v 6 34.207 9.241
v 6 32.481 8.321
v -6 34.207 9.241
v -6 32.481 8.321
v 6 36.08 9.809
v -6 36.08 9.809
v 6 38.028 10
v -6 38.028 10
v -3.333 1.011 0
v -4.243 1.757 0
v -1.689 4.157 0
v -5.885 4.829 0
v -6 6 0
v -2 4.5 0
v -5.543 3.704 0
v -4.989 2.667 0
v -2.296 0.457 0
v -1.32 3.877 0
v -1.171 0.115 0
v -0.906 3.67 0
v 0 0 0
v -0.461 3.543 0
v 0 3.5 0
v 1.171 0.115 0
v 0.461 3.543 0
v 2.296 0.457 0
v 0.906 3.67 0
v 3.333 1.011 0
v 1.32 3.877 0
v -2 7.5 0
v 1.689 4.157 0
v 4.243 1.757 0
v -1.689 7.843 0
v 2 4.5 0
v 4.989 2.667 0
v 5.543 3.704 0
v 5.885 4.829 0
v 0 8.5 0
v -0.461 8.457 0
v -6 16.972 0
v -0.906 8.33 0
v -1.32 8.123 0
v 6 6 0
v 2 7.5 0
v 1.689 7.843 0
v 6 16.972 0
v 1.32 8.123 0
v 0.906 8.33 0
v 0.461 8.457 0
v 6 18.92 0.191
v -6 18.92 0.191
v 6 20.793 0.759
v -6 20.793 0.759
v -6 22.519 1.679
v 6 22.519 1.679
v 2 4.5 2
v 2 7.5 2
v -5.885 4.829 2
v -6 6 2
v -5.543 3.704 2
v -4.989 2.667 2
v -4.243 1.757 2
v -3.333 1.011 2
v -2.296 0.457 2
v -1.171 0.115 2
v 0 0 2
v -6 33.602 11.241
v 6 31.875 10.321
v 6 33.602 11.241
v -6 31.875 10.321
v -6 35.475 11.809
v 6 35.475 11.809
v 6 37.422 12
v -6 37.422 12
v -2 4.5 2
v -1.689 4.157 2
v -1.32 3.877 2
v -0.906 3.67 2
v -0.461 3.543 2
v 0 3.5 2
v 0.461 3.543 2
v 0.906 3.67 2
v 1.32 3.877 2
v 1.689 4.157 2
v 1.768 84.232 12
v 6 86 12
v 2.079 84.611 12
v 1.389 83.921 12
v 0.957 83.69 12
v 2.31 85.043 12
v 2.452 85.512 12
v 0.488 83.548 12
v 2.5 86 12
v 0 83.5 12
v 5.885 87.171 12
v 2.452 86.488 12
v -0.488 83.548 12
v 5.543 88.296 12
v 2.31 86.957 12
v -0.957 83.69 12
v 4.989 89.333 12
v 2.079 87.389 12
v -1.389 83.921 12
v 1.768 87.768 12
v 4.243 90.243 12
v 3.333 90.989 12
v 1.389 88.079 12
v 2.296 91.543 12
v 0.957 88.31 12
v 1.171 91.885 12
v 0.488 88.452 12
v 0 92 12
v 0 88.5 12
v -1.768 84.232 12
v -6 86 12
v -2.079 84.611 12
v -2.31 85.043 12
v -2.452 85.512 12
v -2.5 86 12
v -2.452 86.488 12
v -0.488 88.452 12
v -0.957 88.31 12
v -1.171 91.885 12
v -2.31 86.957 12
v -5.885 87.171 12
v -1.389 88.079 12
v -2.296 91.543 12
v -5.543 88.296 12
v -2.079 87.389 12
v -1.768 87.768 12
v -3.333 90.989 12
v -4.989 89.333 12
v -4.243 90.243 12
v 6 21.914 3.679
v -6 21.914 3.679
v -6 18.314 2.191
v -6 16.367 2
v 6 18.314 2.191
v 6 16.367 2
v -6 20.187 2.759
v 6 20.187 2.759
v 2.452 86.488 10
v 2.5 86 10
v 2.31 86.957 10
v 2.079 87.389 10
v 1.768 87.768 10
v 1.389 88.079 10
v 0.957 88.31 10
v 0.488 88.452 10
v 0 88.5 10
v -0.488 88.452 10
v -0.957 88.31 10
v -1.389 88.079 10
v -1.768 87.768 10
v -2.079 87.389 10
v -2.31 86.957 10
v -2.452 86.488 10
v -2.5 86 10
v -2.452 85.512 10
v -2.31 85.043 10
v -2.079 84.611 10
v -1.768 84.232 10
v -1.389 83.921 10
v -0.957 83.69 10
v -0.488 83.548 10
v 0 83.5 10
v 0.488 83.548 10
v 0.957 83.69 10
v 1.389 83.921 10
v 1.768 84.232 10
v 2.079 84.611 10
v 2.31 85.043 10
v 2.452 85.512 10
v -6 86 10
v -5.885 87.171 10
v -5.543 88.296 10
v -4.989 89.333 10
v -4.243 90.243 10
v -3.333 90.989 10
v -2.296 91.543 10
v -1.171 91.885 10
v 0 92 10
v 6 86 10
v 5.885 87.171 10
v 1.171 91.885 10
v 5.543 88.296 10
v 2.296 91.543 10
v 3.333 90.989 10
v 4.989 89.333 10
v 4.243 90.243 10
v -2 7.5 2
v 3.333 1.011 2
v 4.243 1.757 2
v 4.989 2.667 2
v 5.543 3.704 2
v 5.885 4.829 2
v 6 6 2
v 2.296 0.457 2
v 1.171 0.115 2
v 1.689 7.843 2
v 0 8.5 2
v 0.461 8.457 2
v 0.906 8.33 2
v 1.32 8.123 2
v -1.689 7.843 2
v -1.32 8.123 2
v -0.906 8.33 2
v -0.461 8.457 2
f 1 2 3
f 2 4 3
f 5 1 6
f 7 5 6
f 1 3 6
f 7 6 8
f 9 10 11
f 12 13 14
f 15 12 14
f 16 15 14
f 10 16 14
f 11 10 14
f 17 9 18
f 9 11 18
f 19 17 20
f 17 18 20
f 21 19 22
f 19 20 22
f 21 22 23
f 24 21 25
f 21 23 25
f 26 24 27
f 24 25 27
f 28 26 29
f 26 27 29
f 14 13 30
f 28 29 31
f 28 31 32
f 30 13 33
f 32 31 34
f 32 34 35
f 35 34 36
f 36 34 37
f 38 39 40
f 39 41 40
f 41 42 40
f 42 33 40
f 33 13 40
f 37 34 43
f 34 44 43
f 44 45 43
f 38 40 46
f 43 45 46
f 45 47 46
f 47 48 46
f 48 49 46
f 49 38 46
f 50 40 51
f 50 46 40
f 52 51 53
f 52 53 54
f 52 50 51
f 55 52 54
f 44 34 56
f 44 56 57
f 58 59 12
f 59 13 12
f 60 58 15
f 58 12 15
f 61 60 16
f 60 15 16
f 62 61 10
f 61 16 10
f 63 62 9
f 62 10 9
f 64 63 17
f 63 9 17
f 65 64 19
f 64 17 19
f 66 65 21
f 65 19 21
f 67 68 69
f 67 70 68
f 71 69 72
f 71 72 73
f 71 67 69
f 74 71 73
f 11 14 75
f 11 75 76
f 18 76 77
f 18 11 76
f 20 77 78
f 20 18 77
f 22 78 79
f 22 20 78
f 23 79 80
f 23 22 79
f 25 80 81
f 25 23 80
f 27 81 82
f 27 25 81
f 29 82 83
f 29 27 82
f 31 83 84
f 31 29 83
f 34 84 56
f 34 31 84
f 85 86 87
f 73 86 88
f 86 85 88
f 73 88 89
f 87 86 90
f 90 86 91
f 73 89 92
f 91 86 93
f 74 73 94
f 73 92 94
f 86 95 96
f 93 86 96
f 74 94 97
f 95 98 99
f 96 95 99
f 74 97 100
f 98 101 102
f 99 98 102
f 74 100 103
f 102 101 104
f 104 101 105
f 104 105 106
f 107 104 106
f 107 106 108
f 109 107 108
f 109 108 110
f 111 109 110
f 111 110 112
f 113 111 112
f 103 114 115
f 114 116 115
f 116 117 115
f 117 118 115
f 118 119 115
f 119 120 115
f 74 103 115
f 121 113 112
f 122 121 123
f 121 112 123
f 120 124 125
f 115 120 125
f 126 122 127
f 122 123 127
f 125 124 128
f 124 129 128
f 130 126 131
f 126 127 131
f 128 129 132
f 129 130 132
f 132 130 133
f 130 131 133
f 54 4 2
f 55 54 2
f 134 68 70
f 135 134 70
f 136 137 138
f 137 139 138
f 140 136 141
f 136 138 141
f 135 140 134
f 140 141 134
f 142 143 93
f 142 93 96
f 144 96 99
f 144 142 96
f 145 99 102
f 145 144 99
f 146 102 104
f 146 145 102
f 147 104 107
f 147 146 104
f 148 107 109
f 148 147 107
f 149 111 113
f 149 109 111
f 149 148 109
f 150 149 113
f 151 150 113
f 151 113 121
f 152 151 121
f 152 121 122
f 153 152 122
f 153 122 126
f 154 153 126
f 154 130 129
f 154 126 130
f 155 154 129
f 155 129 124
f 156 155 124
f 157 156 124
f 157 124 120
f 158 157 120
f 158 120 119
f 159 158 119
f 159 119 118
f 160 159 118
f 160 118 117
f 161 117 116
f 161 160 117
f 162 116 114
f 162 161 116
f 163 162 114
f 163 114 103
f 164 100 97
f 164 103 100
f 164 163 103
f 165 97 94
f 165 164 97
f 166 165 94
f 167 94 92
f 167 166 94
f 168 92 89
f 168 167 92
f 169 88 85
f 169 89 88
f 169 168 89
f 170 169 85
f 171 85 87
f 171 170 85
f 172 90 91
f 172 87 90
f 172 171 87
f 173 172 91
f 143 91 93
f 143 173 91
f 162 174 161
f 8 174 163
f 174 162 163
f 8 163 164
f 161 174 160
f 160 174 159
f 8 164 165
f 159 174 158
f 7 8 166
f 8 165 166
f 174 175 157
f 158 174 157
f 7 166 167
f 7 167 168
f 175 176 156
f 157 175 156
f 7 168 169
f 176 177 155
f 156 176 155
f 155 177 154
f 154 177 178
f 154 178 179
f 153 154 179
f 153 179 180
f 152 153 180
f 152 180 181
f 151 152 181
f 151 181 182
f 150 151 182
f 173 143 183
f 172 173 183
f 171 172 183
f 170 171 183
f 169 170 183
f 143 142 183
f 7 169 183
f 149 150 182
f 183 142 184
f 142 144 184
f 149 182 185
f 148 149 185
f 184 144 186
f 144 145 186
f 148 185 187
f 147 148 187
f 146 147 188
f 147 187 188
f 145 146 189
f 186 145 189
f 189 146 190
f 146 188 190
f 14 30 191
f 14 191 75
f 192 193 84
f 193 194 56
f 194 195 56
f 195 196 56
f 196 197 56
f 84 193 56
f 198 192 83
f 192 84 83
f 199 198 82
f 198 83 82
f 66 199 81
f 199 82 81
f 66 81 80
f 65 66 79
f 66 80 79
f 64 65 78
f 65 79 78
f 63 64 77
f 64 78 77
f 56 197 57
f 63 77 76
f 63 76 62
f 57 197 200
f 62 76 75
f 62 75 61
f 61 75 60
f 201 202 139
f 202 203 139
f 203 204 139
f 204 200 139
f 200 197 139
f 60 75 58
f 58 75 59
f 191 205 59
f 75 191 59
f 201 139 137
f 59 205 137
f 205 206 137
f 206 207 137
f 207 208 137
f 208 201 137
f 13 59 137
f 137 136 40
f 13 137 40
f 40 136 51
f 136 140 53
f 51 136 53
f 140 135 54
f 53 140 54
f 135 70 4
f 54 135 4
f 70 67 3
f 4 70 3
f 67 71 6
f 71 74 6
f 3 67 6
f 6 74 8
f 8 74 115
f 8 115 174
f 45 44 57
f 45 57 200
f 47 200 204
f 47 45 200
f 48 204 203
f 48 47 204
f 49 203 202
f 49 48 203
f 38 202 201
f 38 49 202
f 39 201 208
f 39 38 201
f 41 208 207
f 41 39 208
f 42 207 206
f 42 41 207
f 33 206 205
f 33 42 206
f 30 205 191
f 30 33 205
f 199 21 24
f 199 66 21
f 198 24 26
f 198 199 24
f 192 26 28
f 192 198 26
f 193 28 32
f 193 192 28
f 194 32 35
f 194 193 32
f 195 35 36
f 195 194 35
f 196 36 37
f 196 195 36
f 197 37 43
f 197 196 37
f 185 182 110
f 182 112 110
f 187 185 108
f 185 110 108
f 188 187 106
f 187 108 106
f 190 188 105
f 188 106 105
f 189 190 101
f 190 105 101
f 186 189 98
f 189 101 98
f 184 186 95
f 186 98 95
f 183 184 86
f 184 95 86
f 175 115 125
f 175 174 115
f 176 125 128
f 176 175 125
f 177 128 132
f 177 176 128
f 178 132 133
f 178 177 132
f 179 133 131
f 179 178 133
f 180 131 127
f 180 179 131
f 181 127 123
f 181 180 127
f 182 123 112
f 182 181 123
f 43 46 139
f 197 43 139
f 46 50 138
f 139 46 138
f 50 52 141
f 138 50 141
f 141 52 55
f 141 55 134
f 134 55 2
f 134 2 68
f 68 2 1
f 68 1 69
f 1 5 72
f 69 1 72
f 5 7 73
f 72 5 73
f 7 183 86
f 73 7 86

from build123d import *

# Parameters (mm, degrees)
F1_W     = 12
F1_H     = 2
F3_R     = 10
F5_DEPTH = 12.001
F6_R     = 2.5
F7_DEPTH = 12.001
F8_R     = 5.99999
F9_R     = 5.99999


# Not quite as in the source:
# - a fillet or chamfer is up to 0.001 mm smaller than in the source, because OpenCascade refuses the exact size


with BuildPart() as f2:
    # F2: sweep along a path in F0
    with BuildLine(Plane.YZ) as f2_path:
        Line((0, 0), (20, 0))
        Line((20, 0), (35, 10))
        Line((35, 10), (92, 10))
    # F1 (on Front) → F2 (sweep)
    with BuildSketch(Plane.XZ):
        with Locations((0, 1)):
            Rectangle(F1_W, F1_H)
    sweep(path=f2_path.line, transition=Transition.RIGHT)

    # F3
    f3_edges = [f2.edges().sort_by_distance(p)[0] for p in [
        (0, 19.394449, 2),
        (0, 34.394449, 12),
        (0, 35, 10),
        (0, 20, 0),
    ]]
    fillet(f3_edges, radius=F3_R)

    # F4 (on Top) → F5 (cut, through all)
    with BuildSketch(Plane.XY):
        with BuildLine():
            Line((2, 4.5), (2, 7.5))
            ThreePointArc((2, 7.5), (0, 8.5), (-2, 7.5))
            Line((-2, 7.5), (-2, 4.5))
            ThreePointArc((-2, 4.5), (0, 3.5), (2, 4.5))
        make_face()
    extrude(amount=F5_DEPTH, mode=Mode.SUBTRACT)

    # F6 (on Top) → F7 (cut, through all)
    with BuildSketch(Plane.XY):
        with Locations((0, 86)):
            Circle(F6_R)
    extrude(amount=F7_DEPTH, mode=Mode.SUBTRACT)

    # F8 (radius 6 in the source; OpenCascade refuses exactly that, so slightly less here)
    f8_edges = [f2.edges().sort_by_distance(p)[0] for p in [
        (-6, 0, 1),
        (6, 0, 1),
    ]]
    fillet(f8_edges, radius=F8_R)

    # F9 (radius 6 in the source; OpenCascade refuses exactly that, so slightly less here)
    f9_edges = [f2.edges().sort_by_distance(p)[0] for p in [
        (6, 92, 11),
        (-6, 92, 11),
    ]]
    fillet(f9_edges, radius=F9_R)


solid = f2.part
